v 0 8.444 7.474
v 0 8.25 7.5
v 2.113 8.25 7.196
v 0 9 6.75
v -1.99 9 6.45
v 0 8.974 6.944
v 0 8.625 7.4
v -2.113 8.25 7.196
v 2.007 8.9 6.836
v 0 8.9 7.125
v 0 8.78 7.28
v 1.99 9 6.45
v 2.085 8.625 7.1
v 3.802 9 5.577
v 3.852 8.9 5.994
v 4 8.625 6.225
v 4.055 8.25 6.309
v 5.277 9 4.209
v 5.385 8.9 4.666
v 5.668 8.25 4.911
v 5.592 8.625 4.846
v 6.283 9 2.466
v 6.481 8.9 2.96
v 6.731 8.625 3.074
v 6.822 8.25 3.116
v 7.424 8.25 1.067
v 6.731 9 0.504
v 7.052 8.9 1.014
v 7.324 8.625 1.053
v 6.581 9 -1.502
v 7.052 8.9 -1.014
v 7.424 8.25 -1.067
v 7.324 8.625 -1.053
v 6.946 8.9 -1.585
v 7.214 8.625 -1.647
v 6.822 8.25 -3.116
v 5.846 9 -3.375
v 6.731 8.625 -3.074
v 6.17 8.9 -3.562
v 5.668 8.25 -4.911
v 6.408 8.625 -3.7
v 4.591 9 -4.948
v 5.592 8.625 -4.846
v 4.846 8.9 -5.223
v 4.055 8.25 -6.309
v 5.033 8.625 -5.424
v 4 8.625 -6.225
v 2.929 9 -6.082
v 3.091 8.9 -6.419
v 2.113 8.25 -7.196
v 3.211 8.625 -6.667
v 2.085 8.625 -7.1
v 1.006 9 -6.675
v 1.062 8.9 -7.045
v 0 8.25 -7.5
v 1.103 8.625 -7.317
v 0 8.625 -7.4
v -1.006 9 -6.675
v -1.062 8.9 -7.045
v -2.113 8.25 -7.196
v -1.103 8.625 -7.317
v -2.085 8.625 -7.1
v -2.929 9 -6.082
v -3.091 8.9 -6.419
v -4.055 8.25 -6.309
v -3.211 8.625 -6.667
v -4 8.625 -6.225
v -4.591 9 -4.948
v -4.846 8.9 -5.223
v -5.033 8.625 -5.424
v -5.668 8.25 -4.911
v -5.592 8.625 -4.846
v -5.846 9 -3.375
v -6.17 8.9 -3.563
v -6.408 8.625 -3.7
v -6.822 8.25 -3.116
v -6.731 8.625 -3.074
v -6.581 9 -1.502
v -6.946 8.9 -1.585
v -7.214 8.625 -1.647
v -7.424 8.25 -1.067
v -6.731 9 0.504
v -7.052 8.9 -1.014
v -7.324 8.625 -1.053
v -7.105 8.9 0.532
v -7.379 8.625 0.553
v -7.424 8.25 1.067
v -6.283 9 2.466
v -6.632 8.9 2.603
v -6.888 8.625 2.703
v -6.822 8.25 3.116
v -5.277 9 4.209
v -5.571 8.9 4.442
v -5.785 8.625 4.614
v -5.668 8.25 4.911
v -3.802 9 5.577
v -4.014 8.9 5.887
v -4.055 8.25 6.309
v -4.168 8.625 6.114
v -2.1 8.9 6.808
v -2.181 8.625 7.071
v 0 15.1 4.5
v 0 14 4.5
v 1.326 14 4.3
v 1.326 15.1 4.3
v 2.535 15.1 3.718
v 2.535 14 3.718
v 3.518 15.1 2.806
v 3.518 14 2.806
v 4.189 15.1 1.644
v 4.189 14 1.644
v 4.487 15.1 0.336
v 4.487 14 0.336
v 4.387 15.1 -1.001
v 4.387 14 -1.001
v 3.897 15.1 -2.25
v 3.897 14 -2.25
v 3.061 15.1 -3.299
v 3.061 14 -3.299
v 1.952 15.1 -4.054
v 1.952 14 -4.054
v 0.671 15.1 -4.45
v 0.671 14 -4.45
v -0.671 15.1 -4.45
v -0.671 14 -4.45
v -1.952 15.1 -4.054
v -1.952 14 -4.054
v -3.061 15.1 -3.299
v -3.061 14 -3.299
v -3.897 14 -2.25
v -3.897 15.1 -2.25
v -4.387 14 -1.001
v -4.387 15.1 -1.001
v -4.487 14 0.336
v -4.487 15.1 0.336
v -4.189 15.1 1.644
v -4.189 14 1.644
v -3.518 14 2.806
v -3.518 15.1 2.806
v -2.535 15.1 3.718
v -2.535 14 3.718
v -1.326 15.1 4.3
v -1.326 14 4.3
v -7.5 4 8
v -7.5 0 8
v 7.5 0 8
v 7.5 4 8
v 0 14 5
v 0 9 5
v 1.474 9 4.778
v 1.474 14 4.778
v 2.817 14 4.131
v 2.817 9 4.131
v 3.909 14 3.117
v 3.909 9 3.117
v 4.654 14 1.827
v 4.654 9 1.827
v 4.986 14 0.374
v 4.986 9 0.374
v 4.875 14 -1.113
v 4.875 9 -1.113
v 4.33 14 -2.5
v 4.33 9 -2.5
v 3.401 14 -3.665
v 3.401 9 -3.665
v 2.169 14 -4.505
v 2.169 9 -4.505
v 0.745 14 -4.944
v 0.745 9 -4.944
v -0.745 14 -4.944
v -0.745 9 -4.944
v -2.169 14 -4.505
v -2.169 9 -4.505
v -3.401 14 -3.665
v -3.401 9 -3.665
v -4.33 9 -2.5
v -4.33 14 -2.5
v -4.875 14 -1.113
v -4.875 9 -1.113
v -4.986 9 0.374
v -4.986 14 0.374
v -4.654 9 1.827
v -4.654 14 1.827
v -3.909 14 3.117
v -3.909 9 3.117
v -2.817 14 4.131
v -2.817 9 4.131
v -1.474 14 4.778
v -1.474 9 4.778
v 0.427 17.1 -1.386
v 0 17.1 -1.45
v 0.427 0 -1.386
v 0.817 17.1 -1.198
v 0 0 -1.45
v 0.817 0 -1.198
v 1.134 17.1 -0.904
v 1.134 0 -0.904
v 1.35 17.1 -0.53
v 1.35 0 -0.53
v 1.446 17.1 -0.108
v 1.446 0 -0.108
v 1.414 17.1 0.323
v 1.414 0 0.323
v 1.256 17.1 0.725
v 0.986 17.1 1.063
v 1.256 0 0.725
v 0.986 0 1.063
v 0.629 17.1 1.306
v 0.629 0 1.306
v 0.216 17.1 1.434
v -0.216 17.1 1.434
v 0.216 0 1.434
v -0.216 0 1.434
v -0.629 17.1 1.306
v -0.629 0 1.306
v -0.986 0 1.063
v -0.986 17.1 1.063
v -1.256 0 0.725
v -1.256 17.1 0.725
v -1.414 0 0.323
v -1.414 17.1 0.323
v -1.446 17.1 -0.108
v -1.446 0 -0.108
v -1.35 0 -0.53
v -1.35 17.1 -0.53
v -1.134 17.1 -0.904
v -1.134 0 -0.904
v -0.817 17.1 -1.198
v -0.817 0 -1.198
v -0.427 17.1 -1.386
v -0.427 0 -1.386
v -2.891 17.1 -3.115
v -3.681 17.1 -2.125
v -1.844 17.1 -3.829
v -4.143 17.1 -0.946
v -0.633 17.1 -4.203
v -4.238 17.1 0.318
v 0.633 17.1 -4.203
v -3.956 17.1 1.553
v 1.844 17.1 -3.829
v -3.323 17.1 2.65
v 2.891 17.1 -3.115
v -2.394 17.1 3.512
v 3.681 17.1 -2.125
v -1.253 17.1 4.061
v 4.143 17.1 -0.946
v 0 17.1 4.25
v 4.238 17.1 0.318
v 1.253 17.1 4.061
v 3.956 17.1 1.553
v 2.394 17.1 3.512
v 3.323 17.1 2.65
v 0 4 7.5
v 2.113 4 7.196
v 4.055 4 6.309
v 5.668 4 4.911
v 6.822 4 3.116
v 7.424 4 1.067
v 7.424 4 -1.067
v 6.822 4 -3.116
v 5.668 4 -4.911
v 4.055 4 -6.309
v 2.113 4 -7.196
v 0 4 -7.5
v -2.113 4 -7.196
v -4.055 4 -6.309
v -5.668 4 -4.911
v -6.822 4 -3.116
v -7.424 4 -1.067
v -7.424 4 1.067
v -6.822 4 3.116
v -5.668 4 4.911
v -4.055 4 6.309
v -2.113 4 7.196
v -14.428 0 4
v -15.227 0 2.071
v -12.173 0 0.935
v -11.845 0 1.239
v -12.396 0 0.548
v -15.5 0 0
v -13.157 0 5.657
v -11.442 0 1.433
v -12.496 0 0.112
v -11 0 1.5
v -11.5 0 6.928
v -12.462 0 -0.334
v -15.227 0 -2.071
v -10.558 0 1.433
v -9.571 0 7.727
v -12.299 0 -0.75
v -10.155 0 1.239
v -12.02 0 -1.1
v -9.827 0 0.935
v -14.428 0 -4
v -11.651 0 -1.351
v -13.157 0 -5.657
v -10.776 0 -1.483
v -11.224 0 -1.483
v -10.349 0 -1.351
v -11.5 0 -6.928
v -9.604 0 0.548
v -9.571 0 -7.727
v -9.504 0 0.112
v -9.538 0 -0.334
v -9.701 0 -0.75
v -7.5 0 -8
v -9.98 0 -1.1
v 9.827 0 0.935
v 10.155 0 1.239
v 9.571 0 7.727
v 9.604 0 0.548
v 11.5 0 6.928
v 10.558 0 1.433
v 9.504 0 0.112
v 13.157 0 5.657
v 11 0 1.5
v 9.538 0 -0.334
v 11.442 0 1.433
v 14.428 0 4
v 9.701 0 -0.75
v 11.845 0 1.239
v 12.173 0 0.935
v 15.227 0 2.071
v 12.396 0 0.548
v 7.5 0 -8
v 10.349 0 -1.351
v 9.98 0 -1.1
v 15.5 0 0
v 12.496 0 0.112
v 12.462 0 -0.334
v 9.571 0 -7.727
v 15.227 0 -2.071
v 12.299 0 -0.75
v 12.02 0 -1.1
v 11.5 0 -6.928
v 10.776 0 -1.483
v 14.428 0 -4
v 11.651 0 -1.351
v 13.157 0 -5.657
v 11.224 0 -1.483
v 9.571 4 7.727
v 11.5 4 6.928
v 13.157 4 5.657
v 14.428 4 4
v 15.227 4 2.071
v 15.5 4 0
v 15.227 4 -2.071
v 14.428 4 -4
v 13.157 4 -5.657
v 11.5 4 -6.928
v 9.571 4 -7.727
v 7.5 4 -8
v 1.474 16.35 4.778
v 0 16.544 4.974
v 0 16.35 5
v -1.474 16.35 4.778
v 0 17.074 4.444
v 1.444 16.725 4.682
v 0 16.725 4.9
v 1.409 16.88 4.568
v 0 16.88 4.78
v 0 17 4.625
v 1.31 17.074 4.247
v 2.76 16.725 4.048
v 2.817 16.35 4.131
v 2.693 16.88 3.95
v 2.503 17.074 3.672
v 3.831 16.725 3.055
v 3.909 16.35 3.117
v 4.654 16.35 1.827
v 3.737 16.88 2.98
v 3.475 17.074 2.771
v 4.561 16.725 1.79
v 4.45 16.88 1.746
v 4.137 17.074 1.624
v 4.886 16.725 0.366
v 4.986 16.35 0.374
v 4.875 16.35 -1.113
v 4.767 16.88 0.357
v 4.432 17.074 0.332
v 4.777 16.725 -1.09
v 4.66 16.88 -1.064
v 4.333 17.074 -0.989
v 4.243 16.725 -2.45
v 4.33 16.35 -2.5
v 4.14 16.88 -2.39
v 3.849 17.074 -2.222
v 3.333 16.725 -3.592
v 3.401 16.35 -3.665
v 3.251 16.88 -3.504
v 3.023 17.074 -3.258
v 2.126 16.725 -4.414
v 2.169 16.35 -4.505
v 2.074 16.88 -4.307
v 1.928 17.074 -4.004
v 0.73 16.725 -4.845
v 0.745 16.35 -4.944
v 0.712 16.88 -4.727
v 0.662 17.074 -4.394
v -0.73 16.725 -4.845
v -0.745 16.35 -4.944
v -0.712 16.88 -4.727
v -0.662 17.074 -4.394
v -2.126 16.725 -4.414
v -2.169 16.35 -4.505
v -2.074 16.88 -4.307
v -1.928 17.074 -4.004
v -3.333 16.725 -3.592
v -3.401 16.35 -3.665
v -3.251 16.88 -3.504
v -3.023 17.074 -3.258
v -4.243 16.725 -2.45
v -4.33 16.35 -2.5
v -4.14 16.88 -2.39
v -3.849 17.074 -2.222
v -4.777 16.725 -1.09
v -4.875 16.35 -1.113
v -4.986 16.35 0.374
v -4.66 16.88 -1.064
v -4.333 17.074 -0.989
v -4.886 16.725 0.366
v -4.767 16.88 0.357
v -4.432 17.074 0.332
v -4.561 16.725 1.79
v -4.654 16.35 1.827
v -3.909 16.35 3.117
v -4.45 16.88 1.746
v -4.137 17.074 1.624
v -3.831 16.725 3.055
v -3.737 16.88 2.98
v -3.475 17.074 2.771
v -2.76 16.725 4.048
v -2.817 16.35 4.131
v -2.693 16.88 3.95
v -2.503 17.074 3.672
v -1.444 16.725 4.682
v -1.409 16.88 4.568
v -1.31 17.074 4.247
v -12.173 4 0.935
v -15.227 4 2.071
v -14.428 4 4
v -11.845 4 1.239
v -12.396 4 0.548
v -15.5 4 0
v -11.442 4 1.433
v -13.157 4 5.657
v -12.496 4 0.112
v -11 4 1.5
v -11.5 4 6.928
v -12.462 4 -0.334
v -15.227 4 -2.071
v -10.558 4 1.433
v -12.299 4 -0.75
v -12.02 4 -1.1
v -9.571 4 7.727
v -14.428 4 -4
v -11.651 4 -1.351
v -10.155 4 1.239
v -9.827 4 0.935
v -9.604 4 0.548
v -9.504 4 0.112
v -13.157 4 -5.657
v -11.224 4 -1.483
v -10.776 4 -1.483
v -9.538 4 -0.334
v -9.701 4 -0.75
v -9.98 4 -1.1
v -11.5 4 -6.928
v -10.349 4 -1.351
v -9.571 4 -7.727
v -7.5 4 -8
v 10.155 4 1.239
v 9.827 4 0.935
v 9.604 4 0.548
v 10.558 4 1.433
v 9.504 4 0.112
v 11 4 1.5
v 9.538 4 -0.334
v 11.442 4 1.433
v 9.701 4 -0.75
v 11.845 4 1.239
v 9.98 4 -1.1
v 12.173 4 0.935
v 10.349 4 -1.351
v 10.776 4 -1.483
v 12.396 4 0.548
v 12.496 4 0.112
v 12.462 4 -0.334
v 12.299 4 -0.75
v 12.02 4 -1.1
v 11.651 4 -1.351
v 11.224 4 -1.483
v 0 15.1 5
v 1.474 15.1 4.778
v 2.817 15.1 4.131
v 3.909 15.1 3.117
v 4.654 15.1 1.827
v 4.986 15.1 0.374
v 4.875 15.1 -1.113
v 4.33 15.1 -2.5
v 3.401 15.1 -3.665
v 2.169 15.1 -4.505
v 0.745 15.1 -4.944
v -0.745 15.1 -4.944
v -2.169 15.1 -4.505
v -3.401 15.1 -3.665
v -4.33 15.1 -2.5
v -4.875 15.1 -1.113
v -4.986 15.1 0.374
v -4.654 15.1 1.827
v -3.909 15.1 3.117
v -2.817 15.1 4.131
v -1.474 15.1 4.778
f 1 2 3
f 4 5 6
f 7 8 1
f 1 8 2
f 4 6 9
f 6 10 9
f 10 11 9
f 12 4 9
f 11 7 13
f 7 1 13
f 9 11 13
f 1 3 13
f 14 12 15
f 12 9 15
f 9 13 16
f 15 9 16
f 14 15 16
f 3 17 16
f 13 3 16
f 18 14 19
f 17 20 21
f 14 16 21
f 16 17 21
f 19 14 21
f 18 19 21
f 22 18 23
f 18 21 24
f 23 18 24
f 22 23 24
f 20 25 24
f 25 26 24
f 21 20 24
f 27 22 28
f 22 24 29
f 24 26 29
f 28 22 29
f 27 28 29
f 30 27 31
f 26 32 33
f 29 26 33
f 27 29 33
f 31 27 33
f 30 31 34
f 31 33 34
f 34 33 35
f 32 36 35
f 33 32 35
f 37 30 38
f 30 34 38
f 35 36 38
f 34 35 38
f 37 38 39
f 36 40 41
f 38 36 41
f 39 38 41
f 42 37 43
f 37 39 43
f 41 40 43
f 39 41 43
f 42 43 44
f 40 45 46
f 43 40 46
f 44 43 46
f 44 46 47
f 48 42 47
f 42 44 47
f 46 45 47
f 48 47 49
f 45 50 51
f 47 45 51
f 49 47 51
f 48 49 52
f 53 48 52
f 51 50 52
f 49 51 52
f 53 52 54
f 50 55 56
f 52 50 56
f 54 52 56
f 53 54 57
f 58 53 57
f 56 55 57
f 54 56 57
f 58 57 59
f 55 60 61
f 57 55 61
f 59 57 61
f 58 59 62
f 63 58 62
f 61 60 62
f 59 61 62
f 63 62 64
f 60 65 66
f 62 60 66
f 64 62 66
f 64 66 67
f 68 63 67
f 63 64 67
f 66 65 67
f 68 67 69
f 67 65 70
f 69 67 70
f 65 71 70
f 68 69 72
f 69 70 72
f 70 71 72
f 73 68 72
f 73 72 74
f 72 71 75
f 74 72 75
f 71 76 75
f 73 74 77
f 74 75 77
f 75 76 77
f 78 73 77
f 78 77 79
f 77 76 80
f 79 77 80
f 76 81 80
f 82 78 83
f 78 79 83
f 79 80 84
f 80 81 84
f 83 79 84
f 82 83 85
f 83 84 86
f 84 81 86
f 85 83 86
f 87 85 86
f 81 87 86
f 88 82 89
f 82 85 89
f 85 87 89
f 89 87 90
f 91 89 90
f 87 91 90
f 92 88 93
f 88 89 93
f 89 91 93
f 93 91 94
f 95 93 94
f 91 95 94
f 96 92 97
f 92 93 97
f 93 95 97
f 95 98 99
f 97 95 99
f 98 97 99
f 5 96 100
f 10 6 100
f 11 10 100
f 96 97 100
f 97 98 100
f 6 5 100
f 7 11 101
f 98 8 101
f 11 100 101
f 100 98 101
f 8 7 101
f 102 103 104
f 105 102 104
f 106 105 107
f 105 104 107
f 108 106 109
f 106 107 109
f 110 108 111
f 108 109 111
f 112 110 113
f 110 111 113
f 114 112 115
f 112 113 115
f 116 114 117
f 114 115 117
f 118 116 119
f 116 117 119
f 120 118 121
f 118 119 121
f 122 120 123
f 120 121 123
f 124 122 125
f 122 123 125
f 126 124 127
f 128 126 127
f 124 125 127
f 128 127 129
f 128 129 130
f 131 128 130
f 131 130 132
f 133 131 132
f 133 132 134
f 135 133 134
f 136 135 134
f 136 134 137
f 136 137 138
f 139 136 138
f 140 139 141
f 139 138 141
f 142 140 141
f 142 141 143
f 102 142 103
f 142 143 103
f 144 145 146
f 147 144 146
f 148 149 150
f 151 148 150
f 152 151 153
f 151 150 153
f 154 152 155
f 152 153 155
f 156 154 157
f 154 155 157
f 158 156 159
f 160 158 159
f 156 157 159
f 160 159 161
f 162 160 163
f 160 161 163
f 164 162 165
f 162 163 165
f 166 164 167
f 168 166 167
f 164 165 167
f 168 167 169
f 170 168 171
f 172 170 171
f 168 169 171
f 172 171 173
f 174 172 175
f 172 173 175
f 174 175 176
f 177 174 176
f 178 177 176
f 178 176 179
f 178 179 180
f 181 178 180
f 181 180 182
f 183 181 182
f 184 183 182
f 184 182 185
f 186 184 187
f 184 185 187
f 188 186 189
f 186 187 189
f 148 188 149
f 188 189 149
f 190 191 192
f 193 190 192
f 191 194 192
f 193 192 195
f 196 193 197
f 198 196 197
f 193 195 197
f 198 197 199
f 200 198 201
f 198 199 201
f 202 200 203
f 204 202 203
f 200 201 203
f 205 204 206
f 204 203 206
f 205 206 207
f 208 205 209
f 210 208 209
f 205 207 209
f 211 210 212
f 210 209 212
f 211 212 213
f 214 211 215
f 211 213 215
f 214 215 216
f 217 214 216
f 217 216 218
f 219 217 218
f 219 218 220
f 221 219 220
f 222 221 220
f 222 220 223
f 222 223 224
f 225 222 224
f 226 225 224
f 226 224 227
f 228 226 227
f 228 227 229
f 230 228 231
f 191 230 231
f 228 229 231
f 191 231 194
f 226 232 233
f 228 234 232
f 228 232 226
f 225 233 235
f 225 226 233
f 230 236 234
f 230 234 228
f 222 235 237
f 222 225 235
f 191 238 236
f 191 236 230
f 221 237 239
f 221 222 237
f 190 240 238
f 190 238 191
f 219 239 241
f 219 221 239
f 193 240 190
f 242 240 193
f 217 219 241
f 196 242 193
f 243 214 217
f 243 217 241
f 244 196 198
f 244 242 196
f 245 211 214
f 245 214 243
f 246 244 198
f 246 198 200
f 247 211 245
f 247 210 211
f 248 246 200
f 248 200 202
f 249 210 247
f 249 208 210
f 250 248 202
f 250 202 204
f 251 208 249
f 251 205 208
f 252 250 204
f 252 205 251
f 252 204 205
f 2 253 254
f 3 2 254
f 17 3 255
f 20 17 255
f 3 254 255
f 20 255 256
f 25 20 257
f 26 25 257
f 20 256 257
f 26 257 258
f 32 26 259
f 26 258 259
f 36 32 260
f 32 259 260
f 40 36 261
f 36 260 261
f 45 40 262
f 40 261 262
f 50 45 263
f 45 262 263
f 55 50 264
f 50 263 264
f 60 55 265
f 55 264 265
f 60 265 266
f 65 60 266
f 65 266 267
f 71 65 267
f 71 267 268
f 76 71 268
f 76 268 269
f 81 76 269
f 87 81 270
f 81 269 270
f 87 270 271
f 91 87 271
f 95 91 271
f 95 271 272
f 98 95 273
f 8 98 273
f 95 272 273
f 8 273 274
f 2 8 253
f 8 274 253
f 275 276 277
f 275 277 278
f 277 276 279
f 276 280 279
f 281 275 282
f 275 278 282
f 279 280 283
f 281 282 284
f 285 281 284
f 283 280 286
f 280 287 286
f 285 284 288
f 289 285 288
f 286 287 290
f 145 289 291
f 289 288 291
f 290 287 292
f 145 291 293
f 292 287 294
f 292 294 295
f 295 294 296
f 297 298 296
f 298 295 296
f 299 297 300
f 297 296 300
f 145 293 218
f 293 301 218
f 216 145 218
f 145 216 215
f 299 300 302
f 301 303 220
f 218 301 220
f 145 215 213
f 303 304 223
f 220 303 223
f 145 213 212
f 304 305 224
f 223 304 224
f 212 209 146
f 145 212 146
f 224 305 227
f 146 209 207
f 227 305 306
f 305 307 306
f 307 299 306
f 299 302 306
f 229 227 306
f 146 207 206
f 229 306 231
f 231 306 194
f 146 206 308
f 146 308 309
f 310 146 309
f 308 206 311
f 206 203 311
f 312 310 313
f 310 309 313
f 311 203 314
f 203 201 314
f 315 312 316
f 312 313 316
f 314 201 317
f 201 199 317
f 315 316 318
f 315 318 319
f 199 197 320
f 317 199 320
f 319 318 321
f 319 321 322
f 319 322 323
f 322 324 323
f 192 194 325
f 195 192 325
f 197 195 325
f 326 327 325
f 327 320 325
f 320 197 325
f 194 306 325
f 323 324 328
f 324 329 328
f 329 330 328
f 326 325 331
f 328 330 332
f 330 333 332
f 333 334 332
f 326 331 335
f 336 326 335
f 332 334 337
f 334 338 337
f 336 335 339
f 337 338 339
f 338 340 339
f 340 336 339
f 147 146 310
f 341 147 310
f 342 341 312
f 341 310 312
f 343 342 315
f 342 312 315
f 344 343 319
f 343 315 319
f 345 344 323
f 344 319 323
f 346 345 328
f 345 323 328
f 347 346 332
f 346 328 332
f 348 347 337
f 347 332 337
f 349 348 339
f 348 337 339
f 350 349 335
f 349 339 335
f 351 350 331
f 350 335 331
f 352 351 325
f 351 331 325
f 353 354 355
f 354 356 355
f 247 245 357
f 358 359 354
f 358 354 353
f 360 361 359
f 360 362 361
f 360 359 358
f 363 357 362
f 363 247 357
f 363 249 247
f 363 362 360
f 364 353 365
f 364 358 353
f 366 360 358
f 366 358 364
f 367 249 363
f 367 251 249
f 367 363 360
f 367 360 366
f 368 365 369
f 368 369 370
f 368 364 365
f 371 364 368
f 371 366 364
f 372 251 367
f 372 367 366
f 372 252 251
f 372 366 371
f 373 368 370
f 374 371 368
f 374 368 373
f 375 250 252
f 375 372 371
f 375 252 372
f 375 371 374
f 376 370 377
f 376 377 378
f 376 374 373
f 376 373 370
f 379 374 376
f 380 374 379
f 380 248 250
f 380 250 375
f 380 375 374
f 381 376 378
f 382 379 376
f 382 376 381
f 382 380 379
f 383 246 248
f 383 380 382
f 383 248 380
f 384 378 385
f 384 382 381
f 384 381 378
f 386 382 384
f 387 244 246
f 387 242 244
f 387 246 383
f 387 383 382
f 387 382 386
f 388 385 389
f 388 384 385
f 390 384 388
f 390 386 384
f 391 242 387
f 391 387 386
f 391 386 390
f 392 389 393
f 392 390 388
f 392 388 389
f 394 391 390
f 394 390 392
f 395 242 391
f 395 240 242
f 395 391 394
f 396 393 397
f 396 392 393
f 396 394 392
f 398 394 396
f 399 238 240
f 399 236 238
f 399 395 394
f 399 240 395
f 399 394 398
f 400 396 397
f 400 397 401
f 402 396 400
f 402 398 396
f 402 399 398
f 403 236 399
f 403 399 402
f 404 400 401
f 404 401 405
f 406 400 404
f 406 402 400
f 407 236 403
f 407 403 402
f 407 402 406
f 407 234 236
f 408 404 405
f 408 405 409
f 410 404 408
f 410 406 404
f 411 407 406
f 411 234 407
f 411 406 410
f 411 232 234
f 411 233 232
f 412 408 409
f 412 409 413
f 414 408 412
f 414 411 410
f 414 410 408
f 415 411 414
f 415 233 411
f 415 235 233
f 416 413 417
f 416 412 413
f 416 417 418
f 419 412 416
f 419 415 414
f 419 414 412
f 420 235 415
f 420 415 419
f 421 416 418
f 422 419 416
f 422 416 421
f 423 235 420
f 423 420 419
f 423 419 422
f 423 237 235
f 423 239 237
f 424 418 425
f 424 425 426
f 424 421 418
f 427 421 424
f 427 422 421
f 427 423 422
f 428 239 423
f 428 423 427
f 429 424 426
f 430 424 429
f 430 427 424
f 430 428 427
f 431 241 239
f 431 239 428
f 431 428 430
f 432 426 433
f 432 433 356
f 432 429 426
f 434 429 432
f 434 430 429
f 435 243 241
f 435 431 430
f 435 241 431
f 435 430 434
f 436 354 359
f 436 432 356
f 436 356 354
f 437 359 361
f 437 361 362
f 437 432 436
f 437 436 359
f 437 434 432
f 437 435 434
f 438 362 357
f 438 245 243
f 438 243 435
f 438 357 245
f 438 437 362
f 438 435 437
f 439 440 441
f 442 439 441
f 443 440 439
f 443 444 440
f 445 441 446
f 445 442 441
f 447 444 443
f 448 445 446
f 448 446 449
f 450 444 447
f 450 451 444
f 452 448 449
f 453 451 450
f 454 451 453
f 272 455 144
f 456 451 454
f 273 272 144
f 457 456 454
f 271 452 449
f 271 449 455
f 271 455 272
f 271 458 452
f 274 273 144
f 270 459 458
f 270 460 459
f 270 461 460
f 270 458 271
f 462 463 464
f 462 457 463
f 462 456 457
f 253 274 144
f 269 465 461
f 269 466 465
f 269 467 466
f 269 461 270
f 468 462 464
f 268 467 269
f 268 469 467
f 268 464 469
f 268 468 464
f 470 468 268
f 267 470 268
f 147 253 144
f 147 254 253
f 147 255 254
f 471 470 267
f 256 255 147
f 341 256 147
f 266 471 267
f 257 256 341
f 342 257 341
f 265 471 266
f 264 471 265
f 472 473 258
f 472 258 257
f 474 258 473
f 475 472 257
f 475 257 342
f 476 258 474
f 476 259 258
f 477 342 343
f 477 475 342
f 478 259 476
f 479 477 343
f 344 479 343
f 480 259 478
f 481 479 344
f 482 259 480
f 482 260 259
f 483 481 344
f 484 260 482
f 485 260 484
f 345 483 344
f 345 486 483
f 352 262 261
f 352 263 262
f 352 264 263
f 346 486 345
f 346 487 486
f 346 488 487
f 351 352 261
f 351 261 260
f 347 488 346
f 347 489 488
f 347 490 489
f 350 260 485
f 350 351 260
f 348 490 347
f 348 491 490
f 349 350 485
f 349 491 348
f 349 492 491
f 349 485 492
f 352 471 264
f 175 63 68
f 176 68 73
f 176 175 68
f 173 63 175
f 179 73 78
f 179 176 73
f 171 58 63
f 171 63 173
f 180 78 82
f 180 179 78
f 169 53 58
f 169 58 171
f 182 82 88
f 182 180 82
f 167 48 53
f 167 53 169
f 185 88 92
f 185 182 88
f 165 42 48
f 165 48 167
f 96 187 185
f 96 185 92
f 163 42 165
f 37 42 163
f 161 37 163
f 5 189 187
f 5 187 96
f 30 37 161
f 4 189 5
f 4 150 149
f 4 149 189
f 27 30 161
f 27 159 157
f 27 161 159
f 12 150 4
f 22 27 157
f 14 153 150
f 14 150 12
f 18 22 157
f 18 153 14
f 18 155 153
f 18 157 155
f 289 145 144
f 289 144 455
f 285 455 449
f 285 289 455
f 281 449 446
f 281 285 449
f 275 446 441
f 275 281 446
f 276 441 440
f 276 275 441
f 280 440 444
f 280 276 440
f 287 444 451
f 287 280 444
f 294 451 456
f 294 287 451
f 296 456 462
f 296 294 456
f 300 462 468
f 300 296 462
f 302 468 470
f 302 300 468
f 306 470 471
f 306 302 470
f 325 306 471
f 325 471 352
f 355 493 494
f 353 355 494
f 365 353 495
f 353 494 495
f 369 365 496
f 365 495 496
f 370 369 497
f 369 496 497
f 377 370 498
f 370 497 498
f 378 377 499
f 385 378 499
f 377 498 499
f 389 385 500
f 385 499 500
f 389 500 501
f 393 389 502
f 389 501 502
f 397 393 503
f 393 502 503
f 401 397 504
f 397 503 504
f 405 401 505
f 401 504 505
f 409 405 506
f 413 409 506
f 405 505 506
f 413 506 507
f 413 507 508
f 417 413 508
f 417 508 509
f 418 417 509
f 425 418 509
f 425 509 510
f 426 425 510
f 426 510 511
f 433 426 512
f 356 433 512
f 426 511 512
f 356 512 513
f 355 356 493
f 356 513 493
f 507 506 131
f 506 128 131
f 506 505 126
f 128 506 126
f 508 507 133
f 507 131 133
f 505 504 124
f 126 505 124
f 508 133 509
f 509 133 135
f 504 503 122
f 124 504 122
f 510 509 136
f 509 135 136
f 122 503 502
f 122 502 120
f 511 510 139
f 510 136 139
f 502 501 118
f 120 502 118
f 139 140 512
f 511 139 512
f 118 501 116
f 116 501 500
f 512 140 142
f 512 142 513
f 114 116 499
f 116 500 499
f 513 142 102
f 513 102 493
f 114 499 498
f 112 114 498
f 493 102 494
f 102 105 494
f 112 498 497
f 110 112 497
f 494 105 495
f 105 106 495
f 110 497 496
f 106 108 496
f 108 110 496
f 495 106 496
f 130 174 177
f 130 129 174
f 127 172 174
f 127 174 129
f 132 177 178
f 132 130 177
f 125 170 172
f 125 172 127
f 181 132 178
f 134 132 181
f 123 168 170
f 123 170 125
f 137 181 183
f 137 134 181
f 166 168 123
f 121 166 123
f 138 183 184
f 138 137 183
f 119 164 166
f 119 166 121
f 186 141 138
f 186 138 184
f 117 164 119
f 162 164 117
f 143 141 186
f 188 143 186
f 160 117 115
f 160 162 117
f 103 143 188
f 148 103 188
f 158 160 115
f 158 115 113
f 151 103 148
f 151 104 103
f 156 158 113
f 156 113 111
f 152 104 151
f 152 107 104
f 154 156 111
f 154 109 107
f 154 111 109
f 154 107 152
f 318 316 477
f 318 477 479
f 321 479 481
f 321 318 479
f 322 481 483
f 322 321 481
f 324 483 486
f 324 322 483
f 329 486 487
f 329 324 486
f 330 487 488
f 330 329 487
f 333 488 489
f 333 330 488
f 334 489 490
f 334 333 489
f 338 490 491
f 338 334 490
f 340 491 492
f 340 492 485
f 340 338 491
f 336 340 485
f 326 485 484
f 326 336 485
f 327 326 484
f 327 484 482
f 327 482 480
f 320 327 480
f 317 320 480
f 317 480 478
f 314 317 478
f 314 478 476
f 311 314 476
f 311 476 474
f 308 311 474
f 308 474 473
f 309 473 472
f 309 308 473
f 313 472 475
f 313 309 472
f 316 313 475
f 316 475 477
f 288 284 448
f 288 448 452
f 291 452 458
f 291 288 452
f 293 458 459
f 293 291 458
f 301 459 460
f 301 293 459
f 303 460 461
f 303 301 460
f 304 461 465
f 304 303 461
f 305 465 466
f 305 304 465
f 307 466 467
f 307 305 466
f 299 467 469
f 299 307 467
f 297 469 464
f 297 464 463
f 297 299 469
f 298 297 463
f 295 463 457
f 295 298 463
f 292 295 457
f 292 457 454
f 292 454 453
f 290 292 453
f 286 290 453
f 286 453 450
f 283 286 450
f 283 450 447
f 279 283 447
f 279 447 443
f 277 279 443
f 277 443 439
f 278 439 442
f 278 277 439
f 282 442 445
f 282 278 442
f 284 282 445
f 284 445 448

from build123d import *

# Parameters (mm, degrees)
SKETCH_8_R          = 1.5
SKETCH_8_W          = 15
SKETCH_8_H          = 16
EXTRUDE_4_DEPTH     = 4
SKETCH_9_R          = 7.5
EXTRUDE_5_DEPTH     = 5
SKETCH_10_R         = 5
EXTRUDE_6_DEPTH     = 5
SKETCH_12_R         = 4.5
EXTRUDE_7_DEPTH     = 1.1
SKETCH_14_R         = 1.45
CUT_EXTRUDE_1_DEPTH = 24.070760716
SKETCH_15_R         = 5
EXTRUDE_8_DEPTH     = 2
FILLET_2_R          = 0.75
SKETCH_16_R         = 1.45
CUT_EXTRUDE_2_DEPTH = 25.426624818


with BuildPart() as part:
    # 草图8 → 凸台-拉伸4 (new body)
    # profile 1 of 3: a face of its own
    with BuildSketch(Plane(origin=(0, 0, 0), x_dir=(1, 0, 0), z_dir=(0, 1, 0))):
        with BuildLine():
            Line((-7.5, 8), (-7.5, -8))
            ThreePointArc((-7.5, -8), (-15.5, 0), (-7.5, 8))
        make_face()
        with Locations(Location((-11, 0, 0), (0, 0, 270))):
            Circle(SKETCH_8_R, mode=Mode.SUBTRACT)
    # profile 2 of 3: a face of its own
    with BuildSketch(Plane(origin=(0, 0, 0), x_dir=(1, 0, 0), z_dir=(0, 1, 0))):
        Rectangle(SKETCH_8_W, SKETCH_8_H)
    # profile 3 of 3: a face of its own
    with BuildSketch(Plane(origin=(0, 0, 0), x_dir=(1, 0, 0), z_dir=(0, 1, 0))):
        with BuildLine():
            Line((7.5, 8), (7.5, -8))
            ThreePointArc((7.5, -8), (15.5, 0), (7.5, 8))
        make_face()
        with Locations(Location((11, 0, 0), (0, 0, 270))):
            Circle(SKETCH_8_R, mode=Mode.SUBTRACT)
    extrude(amount=EXTRUDE_4_DEPTH)

    # 草图9 → 凸台-拉伸5 (add)
    with BuildSketch(Plane(origin=(0, 4, 0), x_dir=(1, 0, 0), z_dir=(0, 1, 0))):
        with Locations(Location((0, 0, 0), (0, 0, 270))):
            Circle(SKETCH_9_R)
    extrude(amount=EXTRUDE_5_DEPTH)

    # 草图10 → 凸台-拉伸6 (add)
    with BuildSketch(Plane(origin=(0, 9, 0), x_dir=(1, 0, 0), z_dir=(0, 1, 0))):
        with Locations(Location((0, 0, 0), (0, 0, 270))):
            Circle(SKETCH_10_R)
    extrude(amount=EXTRUDE_6_DEPTH)

    # 草图12 → 凸台-拉伸7 (add)
    with BuildSketch(Plane(origin=(0, 14, 0), x_dir=(1, 0, 0), z_dir=(0, 1, 0))):
        with Locations(Location((0, 0, 0), (0, 0, 270))):
            Circle(SKETCH_12_R)
    extrude(amount=EXTRUDE_7_DEPTH)

    # 草图14 → 切除-拉伸1 (cut, through all)
    with BuildSketch(Plane.XZ):
        with Locations(Location((0, 0, 0), (0, 0, 270))):
            Circle(SKETCH_14_R)
    extrude(amount=-CUT_EXTRUDE_1_DEPTH, mode=Mode.SUBTRACT)

    # 草图15 → 凸台-拉伸8 (add)
    with BuildSketch(Plane(origin=(0, 15.1, 0), x_dir=(1, 0, 0), z_dir=(0, 1, 0))):
        with Locations(Location((0, 0, 0), (0, 0, 270))):
            Circle(SKETCH_15_R)
    extrude(amount=EXTRUDE_8_DEPTH)

    # 圆角2
    fillet_2_edges = [part.edges().sort_by_distance(p)[0] for p in [
        (0, 9, -7.5),
        (0, 17.1, -5),
    ]]
    fillet(fillet_2_edges, radius=FILLET_2_R)

    # 草图16 → 切除-拉伸2 (cut, through all)
    with BuildSketch(Plane(origin=(0, 0, 0), x_dir=(-1, 0, 0), z_dir=(0, -1, 0))):
        with Locations(Location((0, 0, 0), (0, 0, 90))):
            Circle(SKETCH_16_R)
    extrude(amount=-CUT_EXTRUDE_2_DEPTH, mode=Mode.SUBTRACT)


solid = part.part
